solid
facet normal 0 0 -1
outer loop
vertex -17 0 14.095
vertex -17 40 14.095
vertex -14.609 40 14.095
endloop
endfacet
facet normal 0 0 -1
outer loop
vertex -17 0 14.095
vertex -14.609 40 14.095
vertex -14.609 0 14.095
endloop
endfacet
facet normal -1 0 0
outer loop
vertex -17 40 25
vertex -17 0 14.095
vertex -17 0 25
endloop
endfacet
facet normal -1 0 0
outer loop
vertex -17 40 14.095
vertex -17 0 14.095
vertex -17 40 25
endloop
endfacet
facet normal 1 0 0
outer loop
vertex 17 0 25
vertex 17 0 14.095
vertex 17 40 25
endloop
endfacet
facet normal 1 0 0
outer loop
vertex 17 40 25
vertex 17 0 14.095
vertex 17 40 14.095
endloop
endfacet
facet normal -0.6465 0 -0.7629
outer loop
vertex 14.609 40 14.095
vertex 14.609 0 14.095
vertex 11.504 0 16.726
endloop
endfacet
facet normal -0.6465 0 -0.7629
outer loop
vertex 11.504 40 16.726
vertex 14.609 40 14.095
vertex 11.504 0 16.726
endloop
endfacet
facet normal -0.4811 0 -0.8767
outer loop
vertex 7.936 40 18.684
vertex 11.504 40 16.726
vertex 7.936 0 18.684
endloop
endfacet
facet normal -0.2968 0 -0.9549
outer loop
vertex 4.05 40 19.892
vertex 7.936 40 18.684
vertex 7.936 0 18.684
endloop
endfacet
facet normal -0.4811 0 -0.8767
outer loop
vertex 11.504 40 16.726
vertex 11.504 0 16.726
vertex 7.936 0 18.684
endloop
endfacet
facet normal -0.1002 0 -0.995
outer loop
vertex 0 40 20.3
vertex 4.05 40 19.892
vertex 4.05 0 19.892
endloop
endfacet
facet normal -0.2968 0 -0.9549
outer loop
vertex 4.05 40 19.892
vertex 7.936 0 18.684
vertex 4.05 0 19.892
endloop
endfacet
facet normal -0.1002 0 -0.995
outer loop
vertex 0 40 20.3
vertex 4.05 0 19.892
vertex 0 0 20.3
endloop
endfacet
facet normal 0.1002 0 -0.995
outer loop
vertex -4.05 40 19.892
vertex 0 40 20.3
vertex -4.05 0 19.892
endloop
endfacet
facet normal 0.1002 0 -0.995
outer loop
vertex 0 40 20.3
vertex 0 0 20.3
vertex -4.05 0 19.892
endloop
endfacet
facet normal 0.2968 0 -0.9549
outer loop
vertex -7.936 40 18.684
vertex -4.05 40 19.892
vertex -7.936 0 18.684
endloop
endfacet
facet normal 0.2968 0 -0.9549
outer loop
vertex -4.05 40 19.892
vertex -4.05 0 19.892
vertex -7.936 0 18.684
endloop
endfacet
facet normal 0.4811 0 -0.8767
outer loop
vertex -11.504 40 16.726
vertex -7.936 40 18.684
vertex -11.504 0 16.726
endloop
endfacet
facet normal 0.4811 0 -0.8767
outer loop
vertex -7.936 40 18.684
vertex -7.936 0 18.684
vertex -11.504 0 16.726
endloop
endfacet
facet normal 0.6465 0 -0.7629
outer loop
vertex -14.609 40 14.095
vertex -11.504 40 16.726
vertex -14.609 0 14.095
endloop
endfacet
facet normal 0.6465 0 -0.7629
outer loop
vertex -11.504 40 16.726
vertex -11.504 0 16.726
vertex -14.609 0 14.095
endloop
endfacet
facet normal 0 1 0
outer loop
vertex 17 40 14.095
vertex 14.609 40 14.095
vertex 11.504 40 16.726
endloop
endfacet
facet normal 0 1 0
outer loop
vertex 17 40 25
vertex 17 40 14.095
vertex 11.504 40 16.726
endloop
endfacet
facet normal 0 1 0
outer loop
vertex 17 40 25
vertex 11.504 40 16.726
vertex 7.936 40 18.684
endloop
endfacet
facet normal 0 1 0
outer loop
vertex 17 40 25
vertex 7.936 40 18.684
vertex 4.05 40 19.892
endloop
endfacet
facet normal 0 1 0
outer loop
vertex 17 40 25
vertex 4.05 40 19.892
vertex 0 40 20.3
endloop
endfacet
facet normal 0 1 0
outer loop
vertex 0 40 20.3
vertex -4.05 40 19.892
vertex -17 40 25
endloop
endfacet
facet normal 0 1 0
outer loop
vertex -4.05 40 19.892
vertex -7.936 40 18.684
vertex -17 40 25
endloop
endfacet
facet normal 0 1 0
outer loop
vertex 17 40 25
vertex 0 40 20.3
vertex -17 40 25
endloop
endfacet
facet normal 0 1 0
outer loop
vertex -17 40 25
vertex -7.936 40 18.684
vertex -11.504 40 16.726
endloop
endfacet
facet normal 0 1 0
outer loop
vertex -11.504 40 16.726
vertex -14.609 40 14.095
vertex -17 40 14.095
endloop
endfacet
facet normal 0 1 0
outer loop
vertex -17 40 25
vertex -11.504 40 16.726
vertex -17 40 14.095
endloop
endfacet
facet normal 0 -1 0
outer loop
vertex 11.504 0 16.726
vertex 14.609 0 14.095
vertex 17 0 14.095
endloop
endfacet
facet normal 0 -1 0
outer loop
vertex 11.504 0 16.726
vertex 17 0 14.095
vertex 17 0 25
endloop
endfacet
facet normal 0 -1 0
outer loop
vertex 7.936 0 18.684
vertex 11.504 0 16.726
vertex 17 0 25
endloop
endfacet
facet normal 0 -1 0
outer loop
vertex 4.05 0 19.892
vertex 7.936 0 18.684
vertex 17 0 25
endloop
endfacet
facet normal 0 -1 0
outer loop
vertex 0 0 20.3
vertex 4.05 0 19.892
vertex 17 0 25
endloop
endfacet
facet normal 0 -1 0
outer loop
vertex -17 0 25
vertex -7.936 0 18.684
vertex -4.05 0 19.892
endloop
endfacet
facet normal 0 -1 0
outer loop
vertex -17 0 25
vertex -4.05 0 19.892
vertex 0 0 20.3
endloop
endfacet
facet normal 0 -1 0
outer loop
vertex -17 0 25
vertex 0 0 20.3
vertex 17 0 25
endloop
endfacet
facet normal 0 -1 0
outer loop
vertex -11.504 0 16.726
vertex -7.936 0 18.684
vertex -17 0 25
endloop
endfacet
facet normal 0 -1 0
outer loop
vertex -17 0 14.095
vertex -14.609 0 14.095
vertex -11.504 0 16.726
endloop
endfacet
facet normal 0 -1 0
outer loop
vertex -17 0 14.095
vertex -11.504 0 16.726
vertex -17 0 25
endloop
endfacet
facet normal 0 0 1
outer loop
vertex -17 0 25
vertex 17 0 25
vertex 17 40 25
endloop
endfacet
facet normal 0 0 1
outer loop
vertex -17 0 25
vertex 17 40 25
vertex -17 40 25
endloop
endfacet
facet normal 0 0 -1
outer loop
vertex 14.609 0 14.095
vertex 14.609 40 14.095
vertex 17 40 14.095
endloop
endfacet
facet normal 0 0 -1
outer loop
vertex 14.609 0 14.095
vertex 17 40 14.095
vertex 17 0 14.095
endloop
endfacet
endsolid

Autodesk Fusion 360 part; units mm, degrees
sketch "Sketch1" plane through (0, 0, 0) normal (0, 1, 0) x (1, 0, 0)
  circle A0 centre (0, 0) radius 20
  dimension "d1" = 40
extrude "Extrude1" add sketch "Sketch1" along normal blind 140
sketch "Sketch2" plane through (0, 140, 0) normal (0, 1, 0) x (-1, 0, 0)
  circle A0 centre (0, 0) radius 20
  circle A1 centre (0, 0) radius 17
  dimension "d4" = 34
extrude "Extrude2" add sketch "Sketch2" along normal blind 20 contours A1
sketch "Sketch3" plane through (0, 0, 0) normal (1, 0, 0) x (0, 0, -1)
sketch "Sketch4" plane through (0, 0, 0) normal (0, -1, 0) x (1, 0, 0)
  circle A0 centre (0, 0) radius 20
  line L0 (0, 20) -> (-20, 20)
  line L1 (-20, 20) -> (-20, 10)
  line L2 (-20, 10) -> (20, 10)
  line L3 (20, 10) -> (20, 20)
  line L4 (20, 20) -> (0, 20)
extrude "Extrude3" add sketch "Sketch4" against normal blind 40 contours A0 L2 L3 L4 | A0 L0 L1 L2
sketch "Sketch5" plane through (20, 0, 0) normal (1, 0, 0) x (0, 0, -1)
  line L0 (-20, 0) -> (-10, 0)
  line L1 (-10, 0) -> (-10, 40)
  line L2 (-10, 40) -> (-20, 40)
  line L3 (-20, 40) -> (-20, 0)
sketch "Sketch6" plane through (0, 0, 0) normal (0, 1, 0) x (1, 0, 0)
extrude "Extrude4" add 1 faces at (0, 13.3333, 20) along direction (0, 0, 1) blind 5
sketch "Sketch7" plane through (0, 0, 0) normal (0, 1, 0) x (1, 0, 0)
  circle A0 centre (0, 0) radius 20.3
  dimension "d15" = 40.6
extrude "Extrude5" cut sketch "Sketch7" along normal blind 165
extrude "Extrude6" cut 1 faces at (-20, 13.3333, 20) along direction (1, 0, 0) blind 3
extrude "Extrude7" cut 1 faces at (20, 13.3333, 20) along direction (-1, 0, 0) blind 3
sketch "Sketch8" plane through (0, 0, 0) normal (1, 0, 0) x (0, 0, -1)
  line L0 (-11.0946, 40) -> (-14.0946, 40)
  line L1 (-14.0946, 40) -> (-14.0946, -0.0914)
  line L2 (-14.0946, -0.0914) -> (-11.0946, -0.0914)
  line L3 (-11.0946, -0.0914) -> (-11.0946, 40)
  point P0 (-11.0946, 40)
  dimension "d22" = 3
extrude "Extrude8" cut sketch "Sketch8" along normal blind 20 and the other way blind 20
